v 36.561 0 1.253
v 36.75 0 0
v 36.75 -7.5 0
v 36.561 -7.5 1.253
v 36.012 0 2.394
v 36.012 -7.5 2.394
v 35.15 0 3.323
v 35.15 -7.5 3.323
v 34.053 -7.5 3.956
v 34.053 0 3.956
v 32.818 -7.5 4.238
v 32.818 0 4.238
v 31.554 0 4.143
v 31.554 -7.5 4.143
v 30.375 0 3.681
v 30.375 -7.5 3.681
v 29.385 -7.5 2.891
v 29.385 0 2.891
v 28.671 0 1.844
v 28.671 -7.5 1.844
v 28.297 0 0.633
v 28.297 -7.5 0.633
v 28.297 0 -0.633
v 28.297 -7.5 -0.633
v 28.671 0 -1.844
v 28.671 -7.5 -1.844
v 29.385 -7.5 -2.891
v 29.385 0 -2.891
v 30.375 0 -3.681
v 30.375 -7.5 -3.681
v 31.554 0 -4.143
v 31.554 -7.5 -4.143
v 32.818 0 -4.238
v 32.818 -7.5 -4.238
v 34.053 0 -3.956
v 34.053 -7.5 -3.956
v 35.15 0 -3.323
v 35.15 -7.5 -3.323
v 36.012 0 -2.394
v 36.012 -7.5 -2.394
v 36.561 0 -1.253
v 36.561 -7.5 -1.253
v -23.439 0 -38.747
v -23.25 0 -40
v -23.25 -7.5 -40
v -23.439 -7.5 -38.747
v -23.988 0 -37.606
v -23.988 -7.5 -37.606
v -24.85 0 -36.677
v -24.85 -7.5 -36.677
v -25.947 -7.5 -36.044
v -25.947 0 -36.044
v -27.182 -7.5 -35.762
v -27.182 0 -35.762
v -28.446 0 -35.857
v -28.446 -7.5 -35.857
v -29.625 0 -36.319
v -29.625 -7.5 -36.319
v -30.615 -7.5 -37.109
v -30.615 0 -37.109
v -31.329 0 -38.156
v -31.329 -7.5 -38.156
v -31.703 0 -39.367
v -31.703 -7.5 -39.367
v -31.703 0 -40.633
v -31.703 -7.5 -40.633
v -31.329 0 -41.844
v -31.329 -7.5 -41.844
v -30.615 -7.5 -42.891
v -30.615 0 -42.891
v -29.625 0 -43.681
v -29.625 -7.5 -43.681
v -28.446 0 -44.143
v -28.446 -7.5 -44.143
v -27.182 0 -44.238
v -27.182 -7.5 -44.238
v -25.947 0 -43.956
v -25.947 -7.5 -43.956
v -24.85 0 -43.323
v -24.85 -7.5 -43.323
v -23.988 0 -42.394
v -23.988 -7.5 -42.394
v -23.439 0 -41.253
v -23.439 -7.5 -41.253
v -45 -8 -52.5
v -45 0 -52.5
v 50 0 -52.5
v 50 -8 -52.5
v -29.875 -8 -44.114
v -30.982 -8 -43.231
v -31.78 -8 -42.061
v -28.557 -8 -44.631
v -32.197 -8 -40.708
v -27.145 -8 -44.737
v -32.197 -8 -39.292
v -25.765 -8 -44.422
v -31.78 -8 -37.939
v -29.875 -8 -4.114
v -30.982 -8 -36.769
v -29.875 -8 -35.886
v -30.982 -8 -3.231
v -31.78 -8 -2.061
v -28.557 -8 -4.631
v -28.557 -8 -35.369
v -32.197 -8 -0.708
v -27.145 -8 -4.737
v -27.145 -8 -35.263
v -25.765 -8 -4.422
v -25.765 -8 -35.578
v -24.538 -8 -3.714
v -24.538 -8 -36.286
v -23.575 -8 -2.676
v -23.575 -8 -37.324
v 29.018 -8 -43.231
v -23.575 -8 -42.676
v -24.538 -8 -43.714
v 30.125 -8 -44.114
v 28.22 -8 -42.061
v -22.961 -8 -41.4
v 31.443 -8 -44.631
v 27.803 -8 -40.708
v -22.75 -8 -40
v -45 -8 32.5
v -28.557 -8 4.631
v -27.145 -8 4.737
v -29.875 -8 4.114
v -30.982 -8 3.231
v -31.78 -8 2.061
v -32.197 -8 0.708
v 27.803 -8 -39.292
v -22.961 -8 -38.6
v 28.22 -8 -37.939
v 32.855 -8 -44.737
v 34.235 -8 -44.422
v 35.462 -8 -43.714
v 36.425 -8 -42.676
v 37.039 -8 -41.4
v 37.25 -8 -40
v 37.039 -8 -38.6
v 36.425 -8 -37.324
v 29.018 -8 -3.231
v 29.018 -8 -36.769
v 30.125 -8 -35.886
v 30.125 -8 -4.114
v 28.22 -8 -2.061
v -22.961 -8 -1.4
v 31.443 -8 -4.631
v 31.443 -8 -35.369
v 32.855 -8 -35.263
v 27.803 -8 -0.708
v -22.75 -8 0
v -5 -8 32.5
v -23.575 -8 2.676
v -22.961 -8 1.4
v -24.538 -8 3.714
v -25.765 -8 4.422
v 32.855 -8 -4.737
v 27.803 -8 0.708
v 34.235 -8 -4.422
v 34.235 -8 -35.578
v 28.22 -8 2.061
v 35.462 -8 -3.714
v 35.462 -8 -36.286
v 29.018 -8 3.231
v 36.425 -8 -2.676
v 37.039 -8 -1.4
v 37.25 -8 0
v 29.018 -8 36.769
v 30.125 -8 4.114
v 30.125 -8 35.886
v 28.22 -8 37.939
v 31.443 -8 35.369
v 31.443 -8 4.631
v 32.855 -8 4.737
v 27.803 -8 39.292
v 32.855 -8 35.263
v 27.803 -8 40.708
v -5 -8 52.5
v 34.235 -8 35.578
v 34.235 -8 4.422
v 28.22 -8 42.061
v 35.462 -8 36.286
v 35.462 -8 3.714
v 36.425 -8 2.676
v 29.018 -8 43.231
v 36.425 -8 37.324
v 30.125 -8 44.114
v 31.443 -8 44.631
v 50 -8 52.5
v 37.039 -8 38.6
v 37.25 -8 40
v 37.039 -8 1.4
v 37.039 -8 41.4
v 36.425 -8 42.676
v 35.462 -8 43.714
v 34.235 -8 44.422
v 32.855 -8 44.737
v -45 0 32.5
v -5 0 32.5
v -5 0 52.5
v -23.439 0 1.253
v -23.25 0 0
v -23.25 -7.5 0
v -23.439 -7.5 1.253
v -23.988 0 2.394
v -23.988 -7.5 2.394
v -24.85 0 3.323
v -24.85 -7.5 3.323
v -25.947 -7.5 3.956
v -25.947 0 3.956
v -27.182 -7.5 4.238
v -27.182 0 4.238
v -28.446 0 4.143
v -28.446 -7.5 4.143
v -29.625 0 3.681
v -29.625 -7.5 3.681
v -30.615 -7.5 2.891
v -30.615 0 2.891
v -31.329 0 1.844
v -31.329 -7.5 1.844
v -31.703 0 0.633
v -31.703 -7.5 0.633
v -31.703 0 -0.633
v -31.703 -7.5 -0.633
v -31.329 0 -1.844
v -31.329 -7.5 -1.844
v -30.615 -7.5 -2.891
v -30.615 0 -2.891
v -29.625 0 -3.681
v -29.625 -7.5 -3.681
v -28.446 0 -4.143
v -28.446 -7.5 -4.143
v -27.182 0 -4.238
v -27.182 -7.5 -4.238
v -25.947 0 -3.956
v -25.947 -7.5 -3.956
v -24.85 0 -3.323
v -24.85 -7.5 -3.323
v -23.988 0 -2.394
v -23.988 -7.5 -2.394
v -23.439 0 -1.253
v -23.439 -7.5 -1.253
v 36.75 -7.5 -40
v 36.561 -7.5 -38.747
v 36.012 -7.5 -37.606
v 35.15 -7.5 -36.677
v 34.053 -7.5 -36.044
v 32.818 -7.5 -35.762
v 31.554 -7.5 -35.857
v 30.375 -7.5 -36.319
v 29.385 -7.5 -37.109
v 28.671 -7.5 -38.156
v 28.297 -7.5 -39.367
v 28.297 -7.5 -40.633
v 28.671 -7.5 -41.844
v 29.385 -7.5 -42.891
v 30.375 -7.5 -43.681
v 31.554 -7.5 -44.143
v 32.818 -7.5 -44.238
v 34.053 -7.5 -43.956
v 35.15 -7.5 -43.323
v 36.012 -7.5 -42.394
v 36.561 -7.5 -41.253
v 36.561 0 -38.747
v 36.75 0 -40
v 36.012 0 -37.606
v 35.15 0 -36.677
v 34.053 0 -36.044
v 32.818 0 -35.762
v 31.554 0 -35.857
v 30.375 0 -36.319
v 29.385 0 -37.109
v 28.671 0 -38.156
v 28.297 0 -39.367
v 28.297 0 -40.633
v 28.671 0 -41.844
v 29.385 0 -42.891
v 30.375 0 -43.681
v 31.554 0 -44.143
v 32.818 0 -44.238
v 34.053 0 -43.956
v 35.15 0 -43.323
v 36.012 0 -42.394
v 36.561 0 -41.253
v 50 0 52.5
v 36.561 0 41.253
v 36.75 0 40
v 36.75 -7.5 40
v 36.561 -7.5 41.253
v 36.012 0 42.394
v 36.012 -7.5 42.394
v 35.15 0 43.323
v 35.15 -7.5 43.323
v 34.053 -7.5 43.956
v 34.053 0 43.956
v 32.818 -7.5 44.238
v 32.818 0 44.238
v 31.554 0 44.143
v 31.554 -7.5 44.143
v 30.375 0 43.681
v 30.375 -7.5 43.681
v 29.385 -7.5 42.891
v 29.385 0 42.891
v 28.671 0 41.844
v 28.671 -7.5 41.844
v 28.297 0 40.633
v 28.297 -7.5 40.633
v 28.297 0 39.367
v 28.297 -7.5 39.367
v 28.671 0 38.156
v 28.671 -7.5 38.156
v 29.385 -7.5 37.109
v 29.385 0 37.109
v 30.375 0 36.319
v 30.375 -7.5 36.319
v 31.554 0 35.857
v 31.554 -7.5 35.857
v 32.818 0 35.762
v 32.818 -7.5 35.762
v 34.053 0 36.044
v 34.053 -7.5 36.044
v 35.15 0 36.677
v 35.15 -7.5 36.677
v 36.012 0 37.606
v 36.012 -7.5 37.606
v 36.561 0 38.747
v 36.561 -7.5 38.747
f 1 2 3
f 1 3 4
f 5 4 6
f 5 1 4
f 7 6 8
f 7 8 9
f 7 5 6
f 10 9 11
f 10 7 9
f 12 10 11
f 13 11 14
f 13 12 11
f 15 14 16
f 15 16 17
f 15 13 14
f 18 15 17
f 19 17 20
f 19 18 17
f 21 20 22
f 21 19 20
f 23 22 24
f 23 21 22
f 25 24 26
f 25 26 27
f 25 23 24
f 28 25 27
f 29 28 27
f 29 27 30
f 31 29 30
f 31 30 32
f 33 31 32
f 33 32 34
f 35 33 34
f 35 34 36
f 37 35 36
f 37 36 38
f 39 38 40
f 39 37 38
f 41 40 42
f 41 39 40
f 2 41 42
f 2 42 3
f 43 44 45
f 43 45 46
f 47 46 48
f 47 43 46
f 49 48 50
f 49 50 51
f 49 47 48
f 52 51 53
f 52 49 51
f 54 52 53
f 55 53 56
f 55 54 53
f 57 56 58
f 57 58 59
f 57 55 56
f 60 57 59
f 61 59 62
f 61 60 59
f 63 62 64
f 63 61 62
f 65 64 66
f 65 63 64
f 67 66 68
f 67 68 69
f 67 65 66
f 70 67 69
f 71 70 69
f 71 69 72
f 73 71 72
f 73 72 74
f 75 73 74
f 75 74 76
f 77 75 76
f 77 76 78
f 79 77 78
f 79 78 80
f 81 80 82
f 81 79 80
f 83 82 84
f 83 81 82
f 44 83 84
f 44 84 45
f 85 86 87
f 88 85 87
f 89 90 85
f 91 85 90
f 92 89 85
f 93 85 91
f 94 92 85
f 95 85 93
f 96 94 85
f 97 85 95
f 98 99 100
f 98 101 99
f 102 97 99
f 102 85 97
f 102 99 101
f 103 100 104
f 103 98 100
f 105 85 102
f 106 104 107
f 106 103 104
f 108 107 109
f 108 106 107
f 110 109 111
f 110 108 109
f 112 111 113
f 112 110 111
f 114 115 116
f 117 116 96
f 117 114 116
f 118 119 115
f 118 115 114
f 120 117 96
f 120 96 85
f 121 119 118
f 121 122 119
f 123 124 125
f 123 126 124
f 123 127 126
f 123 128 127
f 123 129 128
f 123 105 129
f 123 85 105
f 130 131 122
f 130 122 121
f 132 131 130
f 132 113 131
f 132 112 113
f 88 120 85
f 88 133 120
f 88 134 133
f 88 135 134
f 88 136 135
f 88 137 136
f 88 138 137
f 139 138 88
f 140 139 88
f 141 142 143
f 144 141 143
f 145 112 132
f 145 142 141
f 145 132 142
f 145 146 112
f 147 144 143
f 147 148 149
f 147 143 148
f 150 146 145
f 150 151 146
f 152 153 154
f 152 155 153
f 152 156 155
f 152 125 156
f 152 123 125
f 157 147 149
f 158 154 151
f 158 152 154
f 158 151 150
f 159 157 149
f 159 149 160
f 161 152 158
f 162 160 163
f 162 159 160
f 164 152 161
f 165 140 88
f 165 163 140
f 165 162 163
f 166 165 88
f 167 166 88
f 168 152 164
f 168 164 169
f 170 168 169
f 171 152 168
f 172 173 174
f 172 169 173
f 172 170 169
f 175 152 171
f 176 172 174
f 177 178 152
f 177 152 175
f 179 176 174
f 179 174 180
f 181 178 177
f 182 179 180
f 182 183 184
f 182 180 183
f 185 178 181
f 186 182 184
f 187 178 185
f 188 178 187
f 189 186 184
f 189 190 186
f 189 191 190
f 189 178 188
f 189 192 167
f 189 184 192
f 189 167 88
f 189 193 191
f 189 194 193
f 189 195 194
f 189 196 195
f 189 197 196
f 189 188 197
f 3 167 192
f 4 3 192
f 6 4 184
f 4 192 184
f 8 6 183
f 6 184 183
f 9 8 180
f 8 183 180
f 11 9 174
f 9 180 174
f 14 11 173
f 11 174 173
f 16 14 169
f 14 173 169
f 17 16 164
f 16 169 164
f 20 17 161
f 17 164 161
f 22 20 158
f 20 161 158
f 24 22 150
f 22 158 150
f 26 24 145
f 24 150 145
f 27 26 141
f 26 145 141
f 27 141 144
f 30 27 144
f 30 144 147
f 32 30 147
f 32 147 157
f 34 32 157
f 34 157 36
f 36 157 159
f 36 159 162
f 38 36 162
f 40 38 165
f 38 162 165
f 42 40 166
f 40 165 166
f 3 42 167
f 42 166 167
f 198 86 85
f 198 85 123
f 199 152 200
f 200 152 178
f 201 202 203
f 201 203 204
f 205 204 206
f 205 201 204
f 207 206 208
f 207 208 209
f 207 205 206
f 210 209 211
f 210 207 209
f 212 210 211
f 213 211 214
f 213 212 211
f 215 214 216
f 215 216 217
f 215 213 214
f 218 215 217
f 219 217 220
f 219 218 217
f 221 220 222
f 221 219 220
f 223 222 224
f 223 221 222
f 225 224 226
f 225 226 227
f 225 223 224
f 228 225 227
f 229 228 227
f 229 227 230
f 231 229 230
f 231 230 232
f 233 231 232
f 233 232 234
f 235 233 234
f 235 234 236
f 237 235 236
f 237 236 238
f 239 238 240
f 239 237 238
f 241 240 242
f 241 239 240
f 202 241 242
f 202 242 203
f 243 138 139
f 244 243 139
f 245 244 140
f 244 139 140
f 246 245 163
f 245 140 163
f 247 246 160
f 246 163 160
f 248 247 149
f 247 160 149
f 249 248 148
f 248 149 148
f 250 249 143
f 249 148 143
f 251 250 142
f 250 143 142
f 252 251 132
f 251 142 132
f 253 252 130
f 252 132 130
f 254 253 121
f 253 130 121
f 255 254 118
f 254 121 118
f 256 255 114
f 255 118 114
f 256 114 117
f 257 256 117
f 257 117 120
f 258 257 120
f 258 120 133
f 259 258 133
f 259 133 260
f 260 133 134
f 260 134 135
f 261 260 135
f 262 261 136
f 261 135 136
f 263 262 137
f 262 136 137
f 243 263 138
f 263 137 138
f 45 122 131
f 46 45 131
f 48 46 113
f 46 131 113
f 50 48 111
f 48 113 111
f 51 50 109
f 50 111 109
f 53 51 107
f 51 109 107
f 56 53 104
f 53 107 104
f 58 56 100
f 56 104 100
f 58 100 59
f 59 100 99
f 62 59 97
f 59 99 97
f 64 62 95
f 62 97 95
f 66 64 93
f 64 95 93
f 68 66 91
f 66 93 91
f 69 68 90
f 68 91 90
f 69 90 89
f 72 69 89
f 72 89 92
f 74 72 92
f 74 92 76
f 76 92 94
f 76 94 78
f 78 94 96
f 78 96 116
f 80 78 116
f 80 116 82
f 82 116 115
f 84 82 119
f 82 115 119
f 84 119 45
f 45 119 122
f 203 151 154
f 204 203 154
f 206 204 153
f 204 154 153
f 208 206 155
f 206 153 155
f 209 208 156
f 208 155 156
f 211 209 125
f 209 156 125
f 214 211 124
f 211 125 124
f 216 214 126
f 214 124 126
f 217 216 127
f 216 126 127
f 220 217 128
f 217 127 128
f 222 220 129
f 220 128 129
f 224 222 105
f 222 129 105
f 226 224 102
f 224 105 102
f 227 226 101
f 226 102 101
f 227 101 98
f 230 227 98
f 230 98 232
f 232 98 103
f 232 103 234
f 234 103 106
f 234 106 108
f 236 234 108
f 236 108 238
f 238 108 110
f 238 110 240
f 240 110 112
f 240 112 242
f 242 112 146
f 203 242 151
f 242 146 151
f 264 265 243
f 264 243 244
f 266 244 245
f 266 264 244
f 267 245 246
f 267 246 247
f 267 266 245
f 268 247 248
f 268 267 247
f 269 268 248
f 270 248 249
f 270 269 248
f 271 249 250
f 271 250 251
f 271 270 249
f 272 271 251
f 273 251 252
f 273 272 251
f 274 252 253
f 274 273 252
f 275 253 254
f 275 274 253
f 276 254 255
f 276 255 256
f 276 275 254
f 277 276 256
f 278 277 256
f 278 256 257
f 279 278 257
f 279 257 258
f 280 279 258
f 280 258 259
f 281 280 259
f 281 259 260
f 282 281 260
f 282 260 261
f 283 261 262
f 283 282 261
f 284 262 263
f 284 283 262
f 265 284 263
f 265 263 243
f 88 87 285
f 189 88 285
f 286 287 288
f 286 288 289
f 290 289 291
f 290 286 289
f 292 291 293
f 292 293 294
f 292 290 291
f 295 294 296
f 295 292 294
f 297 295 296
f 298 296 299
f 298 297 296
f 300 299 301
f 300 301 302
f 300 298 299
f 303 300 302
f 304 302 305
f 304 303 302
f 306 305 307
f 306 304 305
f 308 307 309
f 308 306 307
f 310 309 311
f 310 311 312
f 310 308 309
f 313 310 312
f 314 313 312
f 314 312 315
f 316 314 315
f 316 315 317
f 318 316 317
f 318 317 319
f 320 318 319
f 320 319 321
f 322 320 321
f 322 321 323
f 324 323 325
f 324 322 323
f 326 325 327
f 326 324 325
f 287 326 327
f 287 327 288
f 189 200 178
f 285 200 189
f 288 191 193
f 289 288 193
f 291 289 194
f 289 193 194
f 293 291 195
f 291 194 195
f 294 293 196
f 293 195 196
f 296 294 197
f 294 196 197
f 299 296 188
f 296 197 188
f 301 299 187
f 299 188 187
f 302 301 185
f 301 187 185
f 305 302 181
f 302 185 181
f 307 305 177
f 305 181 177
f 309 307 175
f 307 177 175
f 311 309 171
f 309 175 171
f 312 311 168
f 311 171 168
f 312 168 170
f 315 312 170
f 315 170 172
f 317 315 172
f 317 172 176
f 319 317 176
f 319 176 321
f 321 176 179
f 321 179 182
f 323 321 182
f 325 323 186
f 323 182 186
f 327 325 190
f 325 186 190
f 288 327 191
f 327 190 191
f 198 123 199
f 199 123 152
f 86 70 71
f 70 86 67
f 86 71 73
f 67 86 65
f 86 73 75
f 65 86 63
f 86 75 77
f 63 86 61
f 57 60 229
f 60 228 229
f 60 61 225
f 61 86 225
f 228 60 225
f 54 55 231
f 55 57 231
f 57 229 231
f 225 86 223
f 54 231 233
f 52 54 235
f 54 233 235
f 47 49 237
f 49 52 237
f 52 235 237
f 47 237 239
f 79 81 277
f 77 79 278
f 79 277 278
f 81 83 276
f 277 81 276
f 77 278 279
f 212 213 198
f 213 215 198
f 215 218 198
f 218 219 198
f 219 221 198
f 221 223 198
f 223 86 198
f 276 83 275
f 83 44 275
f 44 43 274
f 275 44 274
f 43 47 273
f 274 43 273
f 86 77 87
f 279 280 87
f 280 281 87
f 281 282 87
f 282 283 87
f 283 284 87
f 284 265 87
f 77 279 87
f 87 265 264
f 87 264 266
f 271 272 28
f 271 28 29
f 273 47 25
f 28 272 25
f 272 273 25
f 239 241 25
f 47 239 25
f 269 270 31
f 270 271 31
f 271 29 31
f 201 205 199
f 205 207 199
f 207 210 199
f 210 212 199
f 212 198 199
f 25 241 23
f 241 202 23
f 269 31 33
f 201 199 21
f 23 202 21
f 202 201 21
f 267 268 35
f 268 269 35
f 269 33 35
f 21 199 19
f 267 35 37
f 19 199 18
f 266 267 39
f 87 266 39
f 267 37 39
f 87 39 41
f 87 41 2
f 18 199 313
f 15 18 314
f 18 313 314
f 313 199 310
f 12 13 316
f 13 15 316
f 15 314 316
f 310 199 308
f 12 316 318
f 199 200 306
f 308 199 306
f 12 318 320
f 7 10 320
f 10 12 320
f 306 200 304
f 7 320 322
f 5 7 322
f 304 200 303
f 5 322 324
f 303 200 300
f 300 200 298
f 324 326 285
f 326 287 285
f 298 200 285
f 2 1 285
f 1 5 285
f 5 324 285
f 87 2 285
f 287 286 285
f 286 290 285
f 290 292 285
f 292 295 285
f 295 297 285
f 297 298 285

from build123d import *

# Parameters (mm, degrees)
F0_W     = 95
F0_H     = 105
F0_R     = 4.25
F1_DEPTH = 8
F2_SIZE  = 0.5
F3_W     = 50
F3_H     = 55.8646805584
F4_DEPTH = 25


with BuildPart() as f1:
    # F0 (on Front) → F1 (new body)
    with BuildSketch(Plane.XZ):
        with Locations((2.5, 0)):
            Rectangle(F0_W, F0_H)
        with Locations((-27.5, -40)):
            Circle(F0_R, mode=Mode.SUBTRACT)
        with Locations((32.5, -40)):
            Circle(F0_R, mode=Mode.SUBTRACT)
        with Locations((-27.5, 0)):
            Circle(F0_R, mode=Mode.SUBTRACT)
        with Locations((32.5, 0)):
            Circle(F0_R, mode=Mode.SUBTRACT)
        with Locations((32.5, 40)):
            Circle(F0_R, mode=Mode.SUBTRACT)
    extrude(amount=F1_DEPTH)

    # F2
    f2_edges = [f1.edges().sort_by_distance(p)[0] for p in [
        (28.25, -8, 40),
        (28.25, -8, -40),
        (-31.75, -8, -40),
        (-31.75, -8, 0),
        (28.25, -8, 0),
    ]]
    chamfer(f2_edges, length=F2_SIZE)

    # F3 (on face) → F4 (cut)
    with BuildSketch(Plane.XZ.offset(8)):
        with Locations((-30, 60.4323402792)):
            Rectangle(F3_W, F3_H)
    extrude(amount=-F4_DEPTH, mode=Mode.SUBTRACT)


solid = f1.part
